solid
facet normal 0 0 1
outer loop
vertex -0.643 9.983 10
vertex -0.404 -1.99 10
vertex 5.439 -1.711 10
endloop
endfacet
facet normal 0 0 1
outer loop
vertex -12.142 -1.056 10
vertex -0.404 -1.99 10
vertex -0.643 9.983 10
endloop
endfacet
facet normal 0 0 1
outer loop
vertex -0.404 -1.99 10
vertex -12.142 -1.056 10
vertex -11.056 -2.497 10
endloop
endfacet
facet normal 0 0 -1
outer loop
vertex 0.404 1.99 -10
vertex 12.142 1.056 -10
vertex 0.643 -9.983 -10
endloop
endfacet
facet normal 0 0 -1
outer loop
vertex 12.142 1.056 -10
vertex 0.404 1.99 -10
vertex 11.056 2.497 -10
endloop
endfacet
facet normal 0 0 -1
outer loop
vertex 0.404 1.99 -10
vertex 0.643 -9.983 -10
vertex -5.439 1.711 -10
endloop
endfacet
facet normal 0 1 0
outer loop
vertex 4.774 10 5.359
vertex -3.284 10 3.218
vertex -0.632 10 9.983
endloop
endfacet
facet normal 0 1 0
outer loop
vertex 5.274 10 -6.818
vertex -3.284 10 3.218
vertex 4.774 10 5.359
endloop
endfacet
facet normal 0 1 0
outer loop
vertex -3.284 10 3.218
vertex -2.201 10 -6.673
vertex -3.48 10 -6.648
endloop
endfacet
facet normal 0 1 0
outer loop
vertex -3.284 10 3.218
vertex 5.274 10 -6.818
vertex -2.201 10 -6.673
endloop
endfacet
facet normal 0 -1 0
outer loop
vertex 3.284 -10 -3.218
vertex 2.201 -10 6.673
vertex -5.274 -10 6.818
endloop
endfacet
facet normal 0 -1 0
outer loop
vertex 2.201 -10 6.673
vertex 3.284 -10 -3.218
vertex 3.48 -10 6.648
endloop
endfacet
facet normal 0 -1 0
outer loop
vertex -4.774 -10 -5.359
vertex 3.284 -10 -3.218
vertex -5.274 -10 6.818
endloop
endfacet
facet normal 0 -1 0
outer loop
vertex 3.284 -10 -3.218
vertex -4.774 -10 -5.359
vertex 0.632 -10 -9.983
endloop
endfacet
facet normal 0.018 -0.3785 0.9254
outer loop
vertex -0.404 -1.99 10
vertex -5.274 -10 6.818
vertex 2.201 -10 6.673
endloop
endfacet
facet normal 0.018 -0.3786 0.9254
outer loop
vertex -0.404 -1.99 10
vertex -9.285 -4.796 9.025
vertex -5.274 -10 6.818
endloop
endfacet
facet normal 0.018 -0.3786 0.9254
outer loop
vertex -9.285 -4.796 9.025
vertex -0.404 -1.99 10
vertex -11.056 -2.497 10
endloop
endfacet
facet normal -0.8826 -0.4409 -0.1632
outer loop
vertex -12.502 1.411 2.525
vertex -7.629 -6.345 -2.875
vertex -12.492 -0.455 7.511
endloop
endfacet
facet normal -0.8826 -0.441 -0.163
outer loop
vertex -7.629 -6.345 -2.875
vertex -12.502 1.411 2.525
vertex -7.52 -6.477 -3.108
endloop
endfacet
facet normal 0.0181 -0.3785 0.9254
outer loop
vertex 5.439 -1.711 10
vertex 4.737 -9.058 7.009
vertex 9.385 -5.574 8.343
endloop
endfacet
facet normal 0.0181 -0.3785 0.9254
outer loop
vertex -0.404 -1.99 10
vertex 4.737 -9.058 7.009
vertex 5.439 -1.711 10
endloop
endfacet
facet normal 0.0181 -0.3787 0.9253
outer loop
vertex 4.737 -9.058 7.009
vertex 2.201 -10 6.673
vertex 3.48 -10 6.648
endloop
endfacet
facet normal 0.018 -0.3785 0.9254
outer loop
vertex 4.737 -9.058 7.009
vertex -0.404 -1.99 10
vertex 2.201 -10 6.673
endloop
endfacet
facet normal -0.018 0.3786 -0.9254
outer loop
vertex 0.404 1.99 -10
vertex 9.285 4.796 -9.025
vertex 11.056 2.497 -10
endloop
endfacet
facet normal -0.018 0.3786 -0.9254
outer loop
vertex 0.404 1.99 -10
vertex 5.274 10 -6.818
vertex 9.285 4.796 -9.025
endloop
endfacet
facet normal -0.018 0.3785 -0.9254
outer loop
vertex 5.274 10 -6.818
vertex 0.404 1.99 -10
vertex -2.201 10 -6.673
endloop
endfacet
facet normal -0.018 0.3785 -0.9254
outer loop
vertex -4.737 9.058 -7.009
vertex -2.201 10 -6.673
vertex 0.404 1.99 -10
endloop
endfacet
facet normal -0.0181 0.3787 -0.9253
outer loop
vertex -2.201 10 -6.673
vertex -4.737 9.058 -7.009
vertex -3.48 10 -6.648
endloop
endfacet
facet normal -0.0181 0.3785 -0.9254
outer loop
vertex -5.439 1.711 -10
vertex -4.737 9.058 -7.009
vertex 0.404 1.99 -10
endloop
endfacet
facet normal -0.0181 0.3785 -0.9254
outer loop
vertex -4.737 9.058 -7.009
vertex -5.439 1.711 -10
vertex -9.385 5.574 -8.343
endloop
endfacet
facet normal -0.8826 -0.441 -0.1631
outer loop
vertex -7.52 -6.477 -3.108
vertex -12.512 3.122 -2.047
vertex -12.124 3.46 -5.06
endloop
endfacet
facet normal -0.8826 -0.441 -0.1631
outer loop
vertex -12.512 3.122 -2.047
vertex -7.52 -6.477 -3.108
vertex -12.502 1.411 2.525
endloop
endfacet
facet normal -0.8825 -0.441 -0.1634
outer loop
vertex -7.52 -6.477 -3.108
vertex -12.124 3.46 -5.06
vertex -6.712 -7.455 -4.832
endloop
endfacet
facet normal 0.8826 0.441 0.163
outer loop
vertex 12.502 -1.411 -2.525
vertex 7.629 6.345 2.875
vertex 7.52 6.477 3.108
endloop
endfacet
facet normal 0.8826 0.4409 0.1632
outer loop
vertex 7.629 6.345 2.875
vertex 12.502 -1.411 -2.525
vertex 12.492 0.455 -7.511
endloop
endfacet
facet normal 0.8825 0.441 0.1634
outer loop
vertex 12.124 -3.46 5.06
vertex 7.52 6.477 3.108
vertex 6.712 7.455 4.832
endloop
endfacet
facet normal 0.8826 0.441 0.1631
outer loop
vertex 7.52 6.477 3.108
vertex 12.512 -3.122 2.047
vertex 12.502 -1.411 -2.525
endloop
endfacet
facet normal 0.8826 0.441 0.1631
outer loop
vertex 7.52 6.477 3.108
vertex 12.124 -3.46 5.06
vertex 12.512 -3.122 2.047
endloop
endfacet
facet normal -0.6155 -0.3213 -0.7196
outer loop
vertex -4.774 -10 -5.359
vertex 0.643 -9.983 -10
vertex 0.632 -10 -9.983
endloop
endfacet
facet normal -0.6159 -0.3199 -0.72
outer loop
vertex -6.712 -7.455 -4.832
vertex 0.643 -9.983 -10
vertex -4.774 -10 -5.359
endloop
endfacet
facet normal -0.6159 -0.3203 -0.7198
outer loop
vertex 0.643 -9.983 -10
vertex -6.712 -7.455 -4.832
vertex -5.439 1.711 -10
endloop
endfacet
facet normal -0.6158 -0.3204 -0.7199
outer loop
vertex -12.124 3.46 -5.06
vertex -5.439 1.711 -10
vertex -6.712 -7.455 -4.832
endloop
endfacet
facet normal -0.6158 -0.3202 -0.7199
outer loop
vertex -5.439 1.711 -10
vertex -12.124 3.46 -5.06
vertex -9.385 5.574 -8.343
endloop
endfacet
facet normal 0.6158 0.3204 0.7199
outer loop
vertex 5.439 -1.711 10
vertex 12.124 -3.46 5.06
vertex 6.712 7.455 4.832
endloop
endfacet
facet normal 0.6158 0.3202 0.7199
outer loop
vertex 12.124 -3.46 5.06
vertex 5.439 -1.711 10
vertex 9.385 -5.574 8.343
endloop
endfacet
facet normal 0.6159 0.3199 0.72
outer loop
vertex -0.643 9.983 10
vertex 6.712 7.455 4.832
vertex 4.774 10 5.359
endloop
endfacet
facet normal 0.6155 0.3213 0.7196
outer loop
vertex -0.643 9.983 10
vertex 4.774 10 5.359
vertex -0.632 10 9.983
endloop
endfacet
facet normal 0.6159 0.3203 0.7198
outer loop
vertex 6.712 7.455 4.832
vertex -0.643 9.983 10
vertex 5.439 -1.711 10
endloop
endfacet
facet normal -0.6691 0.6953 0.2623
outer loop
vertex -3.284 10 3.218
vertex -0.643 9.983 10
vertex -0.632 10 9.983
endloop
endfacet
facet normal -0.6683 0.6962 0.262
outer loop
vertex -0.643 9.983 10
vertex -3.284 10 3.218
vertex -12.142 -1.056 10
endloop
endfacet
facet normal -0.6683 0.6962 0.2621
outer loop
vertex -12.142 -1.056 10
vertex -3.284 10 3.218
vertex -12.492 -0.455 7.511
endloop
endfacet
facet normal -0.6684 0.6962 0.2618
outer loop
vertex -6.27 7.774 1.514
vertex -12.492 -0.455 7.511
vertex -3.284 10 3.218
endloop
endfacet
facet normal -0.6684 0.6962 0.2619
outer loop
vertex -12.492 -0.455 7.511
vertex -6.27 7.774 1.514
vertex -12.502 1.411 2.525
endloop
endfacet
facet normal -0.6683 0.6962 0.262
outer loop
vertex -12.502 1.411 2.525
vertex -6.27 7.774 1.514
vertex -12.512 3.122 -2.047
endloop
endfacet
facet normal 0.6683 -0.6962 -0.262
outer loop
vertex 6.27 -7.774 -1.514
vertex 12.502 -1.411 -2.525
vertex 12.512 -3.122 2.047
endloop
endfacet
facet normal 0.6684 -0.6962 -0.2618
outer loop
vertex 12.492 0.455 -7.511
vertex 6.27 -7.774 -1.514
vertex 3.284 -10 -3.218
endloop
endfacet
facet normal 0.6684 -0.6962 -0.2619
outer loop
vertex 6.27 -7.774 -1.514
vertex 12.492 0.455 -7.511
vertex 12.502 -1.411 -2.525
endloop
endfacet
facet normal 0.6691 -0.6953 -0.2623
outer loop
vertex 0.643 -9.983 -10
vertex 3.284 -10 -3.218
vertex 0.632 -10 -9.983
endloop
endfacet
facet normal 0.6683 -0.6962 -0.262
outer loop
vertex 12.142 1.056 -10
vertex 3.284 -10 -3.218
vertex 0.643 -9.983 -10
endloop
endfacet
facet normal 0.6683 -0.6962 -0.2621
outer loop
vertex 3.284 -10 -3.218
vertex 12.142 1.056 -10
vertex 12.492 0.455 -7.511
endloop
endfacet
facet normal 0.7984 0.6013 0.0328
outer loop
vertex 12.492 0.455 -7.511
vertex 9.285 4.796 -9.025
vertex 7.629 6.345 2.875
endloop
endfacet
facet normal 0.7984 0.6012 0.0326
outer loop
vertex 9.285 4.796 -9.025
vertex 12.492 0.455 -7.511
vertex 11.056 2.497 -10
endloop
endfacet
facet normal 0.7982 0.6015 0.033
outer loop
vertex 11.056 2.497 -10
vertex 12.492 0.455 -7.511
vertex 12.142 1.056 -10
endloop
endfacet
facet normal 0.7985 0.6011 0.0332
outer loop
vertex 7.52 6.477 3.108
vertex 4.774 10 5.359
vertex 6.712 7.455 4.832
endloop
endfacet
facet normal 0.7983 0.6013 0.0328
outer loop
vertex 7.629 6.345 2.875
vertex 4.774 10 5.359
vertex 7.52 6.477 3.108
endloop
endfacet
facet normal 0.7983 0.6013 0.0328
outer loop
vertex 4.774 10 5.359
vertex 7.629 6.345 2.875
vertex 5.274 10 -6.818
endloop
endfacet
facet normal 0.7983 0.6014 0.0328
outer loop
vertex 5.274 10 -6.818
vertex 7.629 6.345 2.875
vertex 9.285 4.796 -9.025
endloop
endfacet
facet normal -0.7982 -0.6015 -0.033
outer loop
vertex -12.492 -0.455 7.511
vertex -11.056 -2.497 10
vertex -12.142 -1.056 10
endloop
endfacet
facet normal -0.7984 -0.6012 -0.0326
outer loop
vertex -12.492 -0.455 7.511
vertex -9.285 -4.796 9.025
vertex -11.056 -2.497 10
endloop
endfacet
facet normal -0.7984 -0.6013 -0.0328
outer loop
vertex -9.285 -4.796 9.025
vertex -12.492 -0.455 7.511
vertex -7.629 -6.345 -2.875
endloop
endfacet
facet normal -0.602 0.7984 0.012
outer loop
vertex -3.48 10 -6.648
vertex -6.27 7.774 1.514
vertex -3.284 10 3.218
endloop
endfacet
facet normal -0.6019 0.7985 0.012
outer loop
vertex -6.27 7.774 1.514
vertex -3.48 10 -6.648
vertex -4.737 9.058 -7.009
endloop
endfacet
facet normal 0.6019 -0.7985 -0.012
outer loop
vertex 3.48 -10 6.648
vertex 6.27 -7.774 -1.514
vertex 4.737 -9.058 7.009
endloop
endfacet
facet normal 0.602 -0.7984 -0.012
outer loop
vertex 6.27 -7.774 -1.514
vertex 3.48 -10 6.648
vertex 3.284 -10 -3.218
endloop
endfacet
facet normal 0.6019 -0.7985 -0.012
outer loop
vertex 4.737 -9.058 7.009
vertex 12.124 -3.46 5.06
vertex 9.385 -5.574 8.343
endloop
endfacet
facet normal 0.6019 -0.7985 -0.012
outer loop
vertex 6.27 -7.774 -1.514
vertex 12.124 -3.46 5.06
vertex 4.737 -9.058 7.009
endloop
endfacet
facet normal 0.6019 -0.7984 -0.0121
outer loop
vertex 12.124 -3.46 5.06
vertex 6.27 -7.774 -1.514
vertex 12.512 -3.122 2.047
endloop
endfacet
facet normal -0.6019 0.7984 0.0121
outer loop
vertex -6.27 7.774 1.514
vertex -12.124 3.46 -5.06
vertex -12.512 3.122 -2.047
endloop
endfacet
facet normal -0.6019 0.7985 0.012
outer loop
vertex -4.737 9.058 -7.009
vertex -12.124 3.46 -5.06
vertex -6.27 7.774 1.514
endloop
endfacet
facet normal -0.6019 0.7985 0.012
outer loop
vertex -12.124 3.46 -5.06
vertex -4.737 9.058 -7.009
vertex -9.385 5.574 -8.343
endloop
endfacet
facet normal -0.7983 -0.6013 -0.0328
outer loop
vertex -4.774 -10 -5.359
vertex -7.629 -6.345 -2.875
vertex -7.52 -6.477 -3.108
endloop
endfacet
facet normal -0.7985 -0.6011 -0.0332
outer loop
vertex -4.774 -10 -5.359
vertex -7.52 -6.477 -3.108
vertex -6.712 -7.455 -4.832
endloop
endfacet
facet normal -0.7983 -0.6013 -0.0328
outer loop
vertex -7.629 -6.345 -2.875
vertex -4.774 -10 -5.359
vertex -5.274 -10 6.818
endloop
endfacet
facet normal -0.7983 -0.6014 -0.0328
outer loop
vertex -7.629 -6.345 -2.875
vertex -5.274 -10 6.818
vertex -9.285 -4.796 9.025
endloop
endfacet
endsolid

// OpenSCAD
// Volume: 5936.762827689681, SurfaceArea: 1781.028869460498
// Empty
intersection_for();
// No children
intersection_for(i=1) { }

intersection_for(i = [[0, 0, 0],
                      [10, 20, 300],
                      [200, 40, 57],
                      [20, 88, 57]])
  rotate(i) cube([100, 20, 20], center = true);
